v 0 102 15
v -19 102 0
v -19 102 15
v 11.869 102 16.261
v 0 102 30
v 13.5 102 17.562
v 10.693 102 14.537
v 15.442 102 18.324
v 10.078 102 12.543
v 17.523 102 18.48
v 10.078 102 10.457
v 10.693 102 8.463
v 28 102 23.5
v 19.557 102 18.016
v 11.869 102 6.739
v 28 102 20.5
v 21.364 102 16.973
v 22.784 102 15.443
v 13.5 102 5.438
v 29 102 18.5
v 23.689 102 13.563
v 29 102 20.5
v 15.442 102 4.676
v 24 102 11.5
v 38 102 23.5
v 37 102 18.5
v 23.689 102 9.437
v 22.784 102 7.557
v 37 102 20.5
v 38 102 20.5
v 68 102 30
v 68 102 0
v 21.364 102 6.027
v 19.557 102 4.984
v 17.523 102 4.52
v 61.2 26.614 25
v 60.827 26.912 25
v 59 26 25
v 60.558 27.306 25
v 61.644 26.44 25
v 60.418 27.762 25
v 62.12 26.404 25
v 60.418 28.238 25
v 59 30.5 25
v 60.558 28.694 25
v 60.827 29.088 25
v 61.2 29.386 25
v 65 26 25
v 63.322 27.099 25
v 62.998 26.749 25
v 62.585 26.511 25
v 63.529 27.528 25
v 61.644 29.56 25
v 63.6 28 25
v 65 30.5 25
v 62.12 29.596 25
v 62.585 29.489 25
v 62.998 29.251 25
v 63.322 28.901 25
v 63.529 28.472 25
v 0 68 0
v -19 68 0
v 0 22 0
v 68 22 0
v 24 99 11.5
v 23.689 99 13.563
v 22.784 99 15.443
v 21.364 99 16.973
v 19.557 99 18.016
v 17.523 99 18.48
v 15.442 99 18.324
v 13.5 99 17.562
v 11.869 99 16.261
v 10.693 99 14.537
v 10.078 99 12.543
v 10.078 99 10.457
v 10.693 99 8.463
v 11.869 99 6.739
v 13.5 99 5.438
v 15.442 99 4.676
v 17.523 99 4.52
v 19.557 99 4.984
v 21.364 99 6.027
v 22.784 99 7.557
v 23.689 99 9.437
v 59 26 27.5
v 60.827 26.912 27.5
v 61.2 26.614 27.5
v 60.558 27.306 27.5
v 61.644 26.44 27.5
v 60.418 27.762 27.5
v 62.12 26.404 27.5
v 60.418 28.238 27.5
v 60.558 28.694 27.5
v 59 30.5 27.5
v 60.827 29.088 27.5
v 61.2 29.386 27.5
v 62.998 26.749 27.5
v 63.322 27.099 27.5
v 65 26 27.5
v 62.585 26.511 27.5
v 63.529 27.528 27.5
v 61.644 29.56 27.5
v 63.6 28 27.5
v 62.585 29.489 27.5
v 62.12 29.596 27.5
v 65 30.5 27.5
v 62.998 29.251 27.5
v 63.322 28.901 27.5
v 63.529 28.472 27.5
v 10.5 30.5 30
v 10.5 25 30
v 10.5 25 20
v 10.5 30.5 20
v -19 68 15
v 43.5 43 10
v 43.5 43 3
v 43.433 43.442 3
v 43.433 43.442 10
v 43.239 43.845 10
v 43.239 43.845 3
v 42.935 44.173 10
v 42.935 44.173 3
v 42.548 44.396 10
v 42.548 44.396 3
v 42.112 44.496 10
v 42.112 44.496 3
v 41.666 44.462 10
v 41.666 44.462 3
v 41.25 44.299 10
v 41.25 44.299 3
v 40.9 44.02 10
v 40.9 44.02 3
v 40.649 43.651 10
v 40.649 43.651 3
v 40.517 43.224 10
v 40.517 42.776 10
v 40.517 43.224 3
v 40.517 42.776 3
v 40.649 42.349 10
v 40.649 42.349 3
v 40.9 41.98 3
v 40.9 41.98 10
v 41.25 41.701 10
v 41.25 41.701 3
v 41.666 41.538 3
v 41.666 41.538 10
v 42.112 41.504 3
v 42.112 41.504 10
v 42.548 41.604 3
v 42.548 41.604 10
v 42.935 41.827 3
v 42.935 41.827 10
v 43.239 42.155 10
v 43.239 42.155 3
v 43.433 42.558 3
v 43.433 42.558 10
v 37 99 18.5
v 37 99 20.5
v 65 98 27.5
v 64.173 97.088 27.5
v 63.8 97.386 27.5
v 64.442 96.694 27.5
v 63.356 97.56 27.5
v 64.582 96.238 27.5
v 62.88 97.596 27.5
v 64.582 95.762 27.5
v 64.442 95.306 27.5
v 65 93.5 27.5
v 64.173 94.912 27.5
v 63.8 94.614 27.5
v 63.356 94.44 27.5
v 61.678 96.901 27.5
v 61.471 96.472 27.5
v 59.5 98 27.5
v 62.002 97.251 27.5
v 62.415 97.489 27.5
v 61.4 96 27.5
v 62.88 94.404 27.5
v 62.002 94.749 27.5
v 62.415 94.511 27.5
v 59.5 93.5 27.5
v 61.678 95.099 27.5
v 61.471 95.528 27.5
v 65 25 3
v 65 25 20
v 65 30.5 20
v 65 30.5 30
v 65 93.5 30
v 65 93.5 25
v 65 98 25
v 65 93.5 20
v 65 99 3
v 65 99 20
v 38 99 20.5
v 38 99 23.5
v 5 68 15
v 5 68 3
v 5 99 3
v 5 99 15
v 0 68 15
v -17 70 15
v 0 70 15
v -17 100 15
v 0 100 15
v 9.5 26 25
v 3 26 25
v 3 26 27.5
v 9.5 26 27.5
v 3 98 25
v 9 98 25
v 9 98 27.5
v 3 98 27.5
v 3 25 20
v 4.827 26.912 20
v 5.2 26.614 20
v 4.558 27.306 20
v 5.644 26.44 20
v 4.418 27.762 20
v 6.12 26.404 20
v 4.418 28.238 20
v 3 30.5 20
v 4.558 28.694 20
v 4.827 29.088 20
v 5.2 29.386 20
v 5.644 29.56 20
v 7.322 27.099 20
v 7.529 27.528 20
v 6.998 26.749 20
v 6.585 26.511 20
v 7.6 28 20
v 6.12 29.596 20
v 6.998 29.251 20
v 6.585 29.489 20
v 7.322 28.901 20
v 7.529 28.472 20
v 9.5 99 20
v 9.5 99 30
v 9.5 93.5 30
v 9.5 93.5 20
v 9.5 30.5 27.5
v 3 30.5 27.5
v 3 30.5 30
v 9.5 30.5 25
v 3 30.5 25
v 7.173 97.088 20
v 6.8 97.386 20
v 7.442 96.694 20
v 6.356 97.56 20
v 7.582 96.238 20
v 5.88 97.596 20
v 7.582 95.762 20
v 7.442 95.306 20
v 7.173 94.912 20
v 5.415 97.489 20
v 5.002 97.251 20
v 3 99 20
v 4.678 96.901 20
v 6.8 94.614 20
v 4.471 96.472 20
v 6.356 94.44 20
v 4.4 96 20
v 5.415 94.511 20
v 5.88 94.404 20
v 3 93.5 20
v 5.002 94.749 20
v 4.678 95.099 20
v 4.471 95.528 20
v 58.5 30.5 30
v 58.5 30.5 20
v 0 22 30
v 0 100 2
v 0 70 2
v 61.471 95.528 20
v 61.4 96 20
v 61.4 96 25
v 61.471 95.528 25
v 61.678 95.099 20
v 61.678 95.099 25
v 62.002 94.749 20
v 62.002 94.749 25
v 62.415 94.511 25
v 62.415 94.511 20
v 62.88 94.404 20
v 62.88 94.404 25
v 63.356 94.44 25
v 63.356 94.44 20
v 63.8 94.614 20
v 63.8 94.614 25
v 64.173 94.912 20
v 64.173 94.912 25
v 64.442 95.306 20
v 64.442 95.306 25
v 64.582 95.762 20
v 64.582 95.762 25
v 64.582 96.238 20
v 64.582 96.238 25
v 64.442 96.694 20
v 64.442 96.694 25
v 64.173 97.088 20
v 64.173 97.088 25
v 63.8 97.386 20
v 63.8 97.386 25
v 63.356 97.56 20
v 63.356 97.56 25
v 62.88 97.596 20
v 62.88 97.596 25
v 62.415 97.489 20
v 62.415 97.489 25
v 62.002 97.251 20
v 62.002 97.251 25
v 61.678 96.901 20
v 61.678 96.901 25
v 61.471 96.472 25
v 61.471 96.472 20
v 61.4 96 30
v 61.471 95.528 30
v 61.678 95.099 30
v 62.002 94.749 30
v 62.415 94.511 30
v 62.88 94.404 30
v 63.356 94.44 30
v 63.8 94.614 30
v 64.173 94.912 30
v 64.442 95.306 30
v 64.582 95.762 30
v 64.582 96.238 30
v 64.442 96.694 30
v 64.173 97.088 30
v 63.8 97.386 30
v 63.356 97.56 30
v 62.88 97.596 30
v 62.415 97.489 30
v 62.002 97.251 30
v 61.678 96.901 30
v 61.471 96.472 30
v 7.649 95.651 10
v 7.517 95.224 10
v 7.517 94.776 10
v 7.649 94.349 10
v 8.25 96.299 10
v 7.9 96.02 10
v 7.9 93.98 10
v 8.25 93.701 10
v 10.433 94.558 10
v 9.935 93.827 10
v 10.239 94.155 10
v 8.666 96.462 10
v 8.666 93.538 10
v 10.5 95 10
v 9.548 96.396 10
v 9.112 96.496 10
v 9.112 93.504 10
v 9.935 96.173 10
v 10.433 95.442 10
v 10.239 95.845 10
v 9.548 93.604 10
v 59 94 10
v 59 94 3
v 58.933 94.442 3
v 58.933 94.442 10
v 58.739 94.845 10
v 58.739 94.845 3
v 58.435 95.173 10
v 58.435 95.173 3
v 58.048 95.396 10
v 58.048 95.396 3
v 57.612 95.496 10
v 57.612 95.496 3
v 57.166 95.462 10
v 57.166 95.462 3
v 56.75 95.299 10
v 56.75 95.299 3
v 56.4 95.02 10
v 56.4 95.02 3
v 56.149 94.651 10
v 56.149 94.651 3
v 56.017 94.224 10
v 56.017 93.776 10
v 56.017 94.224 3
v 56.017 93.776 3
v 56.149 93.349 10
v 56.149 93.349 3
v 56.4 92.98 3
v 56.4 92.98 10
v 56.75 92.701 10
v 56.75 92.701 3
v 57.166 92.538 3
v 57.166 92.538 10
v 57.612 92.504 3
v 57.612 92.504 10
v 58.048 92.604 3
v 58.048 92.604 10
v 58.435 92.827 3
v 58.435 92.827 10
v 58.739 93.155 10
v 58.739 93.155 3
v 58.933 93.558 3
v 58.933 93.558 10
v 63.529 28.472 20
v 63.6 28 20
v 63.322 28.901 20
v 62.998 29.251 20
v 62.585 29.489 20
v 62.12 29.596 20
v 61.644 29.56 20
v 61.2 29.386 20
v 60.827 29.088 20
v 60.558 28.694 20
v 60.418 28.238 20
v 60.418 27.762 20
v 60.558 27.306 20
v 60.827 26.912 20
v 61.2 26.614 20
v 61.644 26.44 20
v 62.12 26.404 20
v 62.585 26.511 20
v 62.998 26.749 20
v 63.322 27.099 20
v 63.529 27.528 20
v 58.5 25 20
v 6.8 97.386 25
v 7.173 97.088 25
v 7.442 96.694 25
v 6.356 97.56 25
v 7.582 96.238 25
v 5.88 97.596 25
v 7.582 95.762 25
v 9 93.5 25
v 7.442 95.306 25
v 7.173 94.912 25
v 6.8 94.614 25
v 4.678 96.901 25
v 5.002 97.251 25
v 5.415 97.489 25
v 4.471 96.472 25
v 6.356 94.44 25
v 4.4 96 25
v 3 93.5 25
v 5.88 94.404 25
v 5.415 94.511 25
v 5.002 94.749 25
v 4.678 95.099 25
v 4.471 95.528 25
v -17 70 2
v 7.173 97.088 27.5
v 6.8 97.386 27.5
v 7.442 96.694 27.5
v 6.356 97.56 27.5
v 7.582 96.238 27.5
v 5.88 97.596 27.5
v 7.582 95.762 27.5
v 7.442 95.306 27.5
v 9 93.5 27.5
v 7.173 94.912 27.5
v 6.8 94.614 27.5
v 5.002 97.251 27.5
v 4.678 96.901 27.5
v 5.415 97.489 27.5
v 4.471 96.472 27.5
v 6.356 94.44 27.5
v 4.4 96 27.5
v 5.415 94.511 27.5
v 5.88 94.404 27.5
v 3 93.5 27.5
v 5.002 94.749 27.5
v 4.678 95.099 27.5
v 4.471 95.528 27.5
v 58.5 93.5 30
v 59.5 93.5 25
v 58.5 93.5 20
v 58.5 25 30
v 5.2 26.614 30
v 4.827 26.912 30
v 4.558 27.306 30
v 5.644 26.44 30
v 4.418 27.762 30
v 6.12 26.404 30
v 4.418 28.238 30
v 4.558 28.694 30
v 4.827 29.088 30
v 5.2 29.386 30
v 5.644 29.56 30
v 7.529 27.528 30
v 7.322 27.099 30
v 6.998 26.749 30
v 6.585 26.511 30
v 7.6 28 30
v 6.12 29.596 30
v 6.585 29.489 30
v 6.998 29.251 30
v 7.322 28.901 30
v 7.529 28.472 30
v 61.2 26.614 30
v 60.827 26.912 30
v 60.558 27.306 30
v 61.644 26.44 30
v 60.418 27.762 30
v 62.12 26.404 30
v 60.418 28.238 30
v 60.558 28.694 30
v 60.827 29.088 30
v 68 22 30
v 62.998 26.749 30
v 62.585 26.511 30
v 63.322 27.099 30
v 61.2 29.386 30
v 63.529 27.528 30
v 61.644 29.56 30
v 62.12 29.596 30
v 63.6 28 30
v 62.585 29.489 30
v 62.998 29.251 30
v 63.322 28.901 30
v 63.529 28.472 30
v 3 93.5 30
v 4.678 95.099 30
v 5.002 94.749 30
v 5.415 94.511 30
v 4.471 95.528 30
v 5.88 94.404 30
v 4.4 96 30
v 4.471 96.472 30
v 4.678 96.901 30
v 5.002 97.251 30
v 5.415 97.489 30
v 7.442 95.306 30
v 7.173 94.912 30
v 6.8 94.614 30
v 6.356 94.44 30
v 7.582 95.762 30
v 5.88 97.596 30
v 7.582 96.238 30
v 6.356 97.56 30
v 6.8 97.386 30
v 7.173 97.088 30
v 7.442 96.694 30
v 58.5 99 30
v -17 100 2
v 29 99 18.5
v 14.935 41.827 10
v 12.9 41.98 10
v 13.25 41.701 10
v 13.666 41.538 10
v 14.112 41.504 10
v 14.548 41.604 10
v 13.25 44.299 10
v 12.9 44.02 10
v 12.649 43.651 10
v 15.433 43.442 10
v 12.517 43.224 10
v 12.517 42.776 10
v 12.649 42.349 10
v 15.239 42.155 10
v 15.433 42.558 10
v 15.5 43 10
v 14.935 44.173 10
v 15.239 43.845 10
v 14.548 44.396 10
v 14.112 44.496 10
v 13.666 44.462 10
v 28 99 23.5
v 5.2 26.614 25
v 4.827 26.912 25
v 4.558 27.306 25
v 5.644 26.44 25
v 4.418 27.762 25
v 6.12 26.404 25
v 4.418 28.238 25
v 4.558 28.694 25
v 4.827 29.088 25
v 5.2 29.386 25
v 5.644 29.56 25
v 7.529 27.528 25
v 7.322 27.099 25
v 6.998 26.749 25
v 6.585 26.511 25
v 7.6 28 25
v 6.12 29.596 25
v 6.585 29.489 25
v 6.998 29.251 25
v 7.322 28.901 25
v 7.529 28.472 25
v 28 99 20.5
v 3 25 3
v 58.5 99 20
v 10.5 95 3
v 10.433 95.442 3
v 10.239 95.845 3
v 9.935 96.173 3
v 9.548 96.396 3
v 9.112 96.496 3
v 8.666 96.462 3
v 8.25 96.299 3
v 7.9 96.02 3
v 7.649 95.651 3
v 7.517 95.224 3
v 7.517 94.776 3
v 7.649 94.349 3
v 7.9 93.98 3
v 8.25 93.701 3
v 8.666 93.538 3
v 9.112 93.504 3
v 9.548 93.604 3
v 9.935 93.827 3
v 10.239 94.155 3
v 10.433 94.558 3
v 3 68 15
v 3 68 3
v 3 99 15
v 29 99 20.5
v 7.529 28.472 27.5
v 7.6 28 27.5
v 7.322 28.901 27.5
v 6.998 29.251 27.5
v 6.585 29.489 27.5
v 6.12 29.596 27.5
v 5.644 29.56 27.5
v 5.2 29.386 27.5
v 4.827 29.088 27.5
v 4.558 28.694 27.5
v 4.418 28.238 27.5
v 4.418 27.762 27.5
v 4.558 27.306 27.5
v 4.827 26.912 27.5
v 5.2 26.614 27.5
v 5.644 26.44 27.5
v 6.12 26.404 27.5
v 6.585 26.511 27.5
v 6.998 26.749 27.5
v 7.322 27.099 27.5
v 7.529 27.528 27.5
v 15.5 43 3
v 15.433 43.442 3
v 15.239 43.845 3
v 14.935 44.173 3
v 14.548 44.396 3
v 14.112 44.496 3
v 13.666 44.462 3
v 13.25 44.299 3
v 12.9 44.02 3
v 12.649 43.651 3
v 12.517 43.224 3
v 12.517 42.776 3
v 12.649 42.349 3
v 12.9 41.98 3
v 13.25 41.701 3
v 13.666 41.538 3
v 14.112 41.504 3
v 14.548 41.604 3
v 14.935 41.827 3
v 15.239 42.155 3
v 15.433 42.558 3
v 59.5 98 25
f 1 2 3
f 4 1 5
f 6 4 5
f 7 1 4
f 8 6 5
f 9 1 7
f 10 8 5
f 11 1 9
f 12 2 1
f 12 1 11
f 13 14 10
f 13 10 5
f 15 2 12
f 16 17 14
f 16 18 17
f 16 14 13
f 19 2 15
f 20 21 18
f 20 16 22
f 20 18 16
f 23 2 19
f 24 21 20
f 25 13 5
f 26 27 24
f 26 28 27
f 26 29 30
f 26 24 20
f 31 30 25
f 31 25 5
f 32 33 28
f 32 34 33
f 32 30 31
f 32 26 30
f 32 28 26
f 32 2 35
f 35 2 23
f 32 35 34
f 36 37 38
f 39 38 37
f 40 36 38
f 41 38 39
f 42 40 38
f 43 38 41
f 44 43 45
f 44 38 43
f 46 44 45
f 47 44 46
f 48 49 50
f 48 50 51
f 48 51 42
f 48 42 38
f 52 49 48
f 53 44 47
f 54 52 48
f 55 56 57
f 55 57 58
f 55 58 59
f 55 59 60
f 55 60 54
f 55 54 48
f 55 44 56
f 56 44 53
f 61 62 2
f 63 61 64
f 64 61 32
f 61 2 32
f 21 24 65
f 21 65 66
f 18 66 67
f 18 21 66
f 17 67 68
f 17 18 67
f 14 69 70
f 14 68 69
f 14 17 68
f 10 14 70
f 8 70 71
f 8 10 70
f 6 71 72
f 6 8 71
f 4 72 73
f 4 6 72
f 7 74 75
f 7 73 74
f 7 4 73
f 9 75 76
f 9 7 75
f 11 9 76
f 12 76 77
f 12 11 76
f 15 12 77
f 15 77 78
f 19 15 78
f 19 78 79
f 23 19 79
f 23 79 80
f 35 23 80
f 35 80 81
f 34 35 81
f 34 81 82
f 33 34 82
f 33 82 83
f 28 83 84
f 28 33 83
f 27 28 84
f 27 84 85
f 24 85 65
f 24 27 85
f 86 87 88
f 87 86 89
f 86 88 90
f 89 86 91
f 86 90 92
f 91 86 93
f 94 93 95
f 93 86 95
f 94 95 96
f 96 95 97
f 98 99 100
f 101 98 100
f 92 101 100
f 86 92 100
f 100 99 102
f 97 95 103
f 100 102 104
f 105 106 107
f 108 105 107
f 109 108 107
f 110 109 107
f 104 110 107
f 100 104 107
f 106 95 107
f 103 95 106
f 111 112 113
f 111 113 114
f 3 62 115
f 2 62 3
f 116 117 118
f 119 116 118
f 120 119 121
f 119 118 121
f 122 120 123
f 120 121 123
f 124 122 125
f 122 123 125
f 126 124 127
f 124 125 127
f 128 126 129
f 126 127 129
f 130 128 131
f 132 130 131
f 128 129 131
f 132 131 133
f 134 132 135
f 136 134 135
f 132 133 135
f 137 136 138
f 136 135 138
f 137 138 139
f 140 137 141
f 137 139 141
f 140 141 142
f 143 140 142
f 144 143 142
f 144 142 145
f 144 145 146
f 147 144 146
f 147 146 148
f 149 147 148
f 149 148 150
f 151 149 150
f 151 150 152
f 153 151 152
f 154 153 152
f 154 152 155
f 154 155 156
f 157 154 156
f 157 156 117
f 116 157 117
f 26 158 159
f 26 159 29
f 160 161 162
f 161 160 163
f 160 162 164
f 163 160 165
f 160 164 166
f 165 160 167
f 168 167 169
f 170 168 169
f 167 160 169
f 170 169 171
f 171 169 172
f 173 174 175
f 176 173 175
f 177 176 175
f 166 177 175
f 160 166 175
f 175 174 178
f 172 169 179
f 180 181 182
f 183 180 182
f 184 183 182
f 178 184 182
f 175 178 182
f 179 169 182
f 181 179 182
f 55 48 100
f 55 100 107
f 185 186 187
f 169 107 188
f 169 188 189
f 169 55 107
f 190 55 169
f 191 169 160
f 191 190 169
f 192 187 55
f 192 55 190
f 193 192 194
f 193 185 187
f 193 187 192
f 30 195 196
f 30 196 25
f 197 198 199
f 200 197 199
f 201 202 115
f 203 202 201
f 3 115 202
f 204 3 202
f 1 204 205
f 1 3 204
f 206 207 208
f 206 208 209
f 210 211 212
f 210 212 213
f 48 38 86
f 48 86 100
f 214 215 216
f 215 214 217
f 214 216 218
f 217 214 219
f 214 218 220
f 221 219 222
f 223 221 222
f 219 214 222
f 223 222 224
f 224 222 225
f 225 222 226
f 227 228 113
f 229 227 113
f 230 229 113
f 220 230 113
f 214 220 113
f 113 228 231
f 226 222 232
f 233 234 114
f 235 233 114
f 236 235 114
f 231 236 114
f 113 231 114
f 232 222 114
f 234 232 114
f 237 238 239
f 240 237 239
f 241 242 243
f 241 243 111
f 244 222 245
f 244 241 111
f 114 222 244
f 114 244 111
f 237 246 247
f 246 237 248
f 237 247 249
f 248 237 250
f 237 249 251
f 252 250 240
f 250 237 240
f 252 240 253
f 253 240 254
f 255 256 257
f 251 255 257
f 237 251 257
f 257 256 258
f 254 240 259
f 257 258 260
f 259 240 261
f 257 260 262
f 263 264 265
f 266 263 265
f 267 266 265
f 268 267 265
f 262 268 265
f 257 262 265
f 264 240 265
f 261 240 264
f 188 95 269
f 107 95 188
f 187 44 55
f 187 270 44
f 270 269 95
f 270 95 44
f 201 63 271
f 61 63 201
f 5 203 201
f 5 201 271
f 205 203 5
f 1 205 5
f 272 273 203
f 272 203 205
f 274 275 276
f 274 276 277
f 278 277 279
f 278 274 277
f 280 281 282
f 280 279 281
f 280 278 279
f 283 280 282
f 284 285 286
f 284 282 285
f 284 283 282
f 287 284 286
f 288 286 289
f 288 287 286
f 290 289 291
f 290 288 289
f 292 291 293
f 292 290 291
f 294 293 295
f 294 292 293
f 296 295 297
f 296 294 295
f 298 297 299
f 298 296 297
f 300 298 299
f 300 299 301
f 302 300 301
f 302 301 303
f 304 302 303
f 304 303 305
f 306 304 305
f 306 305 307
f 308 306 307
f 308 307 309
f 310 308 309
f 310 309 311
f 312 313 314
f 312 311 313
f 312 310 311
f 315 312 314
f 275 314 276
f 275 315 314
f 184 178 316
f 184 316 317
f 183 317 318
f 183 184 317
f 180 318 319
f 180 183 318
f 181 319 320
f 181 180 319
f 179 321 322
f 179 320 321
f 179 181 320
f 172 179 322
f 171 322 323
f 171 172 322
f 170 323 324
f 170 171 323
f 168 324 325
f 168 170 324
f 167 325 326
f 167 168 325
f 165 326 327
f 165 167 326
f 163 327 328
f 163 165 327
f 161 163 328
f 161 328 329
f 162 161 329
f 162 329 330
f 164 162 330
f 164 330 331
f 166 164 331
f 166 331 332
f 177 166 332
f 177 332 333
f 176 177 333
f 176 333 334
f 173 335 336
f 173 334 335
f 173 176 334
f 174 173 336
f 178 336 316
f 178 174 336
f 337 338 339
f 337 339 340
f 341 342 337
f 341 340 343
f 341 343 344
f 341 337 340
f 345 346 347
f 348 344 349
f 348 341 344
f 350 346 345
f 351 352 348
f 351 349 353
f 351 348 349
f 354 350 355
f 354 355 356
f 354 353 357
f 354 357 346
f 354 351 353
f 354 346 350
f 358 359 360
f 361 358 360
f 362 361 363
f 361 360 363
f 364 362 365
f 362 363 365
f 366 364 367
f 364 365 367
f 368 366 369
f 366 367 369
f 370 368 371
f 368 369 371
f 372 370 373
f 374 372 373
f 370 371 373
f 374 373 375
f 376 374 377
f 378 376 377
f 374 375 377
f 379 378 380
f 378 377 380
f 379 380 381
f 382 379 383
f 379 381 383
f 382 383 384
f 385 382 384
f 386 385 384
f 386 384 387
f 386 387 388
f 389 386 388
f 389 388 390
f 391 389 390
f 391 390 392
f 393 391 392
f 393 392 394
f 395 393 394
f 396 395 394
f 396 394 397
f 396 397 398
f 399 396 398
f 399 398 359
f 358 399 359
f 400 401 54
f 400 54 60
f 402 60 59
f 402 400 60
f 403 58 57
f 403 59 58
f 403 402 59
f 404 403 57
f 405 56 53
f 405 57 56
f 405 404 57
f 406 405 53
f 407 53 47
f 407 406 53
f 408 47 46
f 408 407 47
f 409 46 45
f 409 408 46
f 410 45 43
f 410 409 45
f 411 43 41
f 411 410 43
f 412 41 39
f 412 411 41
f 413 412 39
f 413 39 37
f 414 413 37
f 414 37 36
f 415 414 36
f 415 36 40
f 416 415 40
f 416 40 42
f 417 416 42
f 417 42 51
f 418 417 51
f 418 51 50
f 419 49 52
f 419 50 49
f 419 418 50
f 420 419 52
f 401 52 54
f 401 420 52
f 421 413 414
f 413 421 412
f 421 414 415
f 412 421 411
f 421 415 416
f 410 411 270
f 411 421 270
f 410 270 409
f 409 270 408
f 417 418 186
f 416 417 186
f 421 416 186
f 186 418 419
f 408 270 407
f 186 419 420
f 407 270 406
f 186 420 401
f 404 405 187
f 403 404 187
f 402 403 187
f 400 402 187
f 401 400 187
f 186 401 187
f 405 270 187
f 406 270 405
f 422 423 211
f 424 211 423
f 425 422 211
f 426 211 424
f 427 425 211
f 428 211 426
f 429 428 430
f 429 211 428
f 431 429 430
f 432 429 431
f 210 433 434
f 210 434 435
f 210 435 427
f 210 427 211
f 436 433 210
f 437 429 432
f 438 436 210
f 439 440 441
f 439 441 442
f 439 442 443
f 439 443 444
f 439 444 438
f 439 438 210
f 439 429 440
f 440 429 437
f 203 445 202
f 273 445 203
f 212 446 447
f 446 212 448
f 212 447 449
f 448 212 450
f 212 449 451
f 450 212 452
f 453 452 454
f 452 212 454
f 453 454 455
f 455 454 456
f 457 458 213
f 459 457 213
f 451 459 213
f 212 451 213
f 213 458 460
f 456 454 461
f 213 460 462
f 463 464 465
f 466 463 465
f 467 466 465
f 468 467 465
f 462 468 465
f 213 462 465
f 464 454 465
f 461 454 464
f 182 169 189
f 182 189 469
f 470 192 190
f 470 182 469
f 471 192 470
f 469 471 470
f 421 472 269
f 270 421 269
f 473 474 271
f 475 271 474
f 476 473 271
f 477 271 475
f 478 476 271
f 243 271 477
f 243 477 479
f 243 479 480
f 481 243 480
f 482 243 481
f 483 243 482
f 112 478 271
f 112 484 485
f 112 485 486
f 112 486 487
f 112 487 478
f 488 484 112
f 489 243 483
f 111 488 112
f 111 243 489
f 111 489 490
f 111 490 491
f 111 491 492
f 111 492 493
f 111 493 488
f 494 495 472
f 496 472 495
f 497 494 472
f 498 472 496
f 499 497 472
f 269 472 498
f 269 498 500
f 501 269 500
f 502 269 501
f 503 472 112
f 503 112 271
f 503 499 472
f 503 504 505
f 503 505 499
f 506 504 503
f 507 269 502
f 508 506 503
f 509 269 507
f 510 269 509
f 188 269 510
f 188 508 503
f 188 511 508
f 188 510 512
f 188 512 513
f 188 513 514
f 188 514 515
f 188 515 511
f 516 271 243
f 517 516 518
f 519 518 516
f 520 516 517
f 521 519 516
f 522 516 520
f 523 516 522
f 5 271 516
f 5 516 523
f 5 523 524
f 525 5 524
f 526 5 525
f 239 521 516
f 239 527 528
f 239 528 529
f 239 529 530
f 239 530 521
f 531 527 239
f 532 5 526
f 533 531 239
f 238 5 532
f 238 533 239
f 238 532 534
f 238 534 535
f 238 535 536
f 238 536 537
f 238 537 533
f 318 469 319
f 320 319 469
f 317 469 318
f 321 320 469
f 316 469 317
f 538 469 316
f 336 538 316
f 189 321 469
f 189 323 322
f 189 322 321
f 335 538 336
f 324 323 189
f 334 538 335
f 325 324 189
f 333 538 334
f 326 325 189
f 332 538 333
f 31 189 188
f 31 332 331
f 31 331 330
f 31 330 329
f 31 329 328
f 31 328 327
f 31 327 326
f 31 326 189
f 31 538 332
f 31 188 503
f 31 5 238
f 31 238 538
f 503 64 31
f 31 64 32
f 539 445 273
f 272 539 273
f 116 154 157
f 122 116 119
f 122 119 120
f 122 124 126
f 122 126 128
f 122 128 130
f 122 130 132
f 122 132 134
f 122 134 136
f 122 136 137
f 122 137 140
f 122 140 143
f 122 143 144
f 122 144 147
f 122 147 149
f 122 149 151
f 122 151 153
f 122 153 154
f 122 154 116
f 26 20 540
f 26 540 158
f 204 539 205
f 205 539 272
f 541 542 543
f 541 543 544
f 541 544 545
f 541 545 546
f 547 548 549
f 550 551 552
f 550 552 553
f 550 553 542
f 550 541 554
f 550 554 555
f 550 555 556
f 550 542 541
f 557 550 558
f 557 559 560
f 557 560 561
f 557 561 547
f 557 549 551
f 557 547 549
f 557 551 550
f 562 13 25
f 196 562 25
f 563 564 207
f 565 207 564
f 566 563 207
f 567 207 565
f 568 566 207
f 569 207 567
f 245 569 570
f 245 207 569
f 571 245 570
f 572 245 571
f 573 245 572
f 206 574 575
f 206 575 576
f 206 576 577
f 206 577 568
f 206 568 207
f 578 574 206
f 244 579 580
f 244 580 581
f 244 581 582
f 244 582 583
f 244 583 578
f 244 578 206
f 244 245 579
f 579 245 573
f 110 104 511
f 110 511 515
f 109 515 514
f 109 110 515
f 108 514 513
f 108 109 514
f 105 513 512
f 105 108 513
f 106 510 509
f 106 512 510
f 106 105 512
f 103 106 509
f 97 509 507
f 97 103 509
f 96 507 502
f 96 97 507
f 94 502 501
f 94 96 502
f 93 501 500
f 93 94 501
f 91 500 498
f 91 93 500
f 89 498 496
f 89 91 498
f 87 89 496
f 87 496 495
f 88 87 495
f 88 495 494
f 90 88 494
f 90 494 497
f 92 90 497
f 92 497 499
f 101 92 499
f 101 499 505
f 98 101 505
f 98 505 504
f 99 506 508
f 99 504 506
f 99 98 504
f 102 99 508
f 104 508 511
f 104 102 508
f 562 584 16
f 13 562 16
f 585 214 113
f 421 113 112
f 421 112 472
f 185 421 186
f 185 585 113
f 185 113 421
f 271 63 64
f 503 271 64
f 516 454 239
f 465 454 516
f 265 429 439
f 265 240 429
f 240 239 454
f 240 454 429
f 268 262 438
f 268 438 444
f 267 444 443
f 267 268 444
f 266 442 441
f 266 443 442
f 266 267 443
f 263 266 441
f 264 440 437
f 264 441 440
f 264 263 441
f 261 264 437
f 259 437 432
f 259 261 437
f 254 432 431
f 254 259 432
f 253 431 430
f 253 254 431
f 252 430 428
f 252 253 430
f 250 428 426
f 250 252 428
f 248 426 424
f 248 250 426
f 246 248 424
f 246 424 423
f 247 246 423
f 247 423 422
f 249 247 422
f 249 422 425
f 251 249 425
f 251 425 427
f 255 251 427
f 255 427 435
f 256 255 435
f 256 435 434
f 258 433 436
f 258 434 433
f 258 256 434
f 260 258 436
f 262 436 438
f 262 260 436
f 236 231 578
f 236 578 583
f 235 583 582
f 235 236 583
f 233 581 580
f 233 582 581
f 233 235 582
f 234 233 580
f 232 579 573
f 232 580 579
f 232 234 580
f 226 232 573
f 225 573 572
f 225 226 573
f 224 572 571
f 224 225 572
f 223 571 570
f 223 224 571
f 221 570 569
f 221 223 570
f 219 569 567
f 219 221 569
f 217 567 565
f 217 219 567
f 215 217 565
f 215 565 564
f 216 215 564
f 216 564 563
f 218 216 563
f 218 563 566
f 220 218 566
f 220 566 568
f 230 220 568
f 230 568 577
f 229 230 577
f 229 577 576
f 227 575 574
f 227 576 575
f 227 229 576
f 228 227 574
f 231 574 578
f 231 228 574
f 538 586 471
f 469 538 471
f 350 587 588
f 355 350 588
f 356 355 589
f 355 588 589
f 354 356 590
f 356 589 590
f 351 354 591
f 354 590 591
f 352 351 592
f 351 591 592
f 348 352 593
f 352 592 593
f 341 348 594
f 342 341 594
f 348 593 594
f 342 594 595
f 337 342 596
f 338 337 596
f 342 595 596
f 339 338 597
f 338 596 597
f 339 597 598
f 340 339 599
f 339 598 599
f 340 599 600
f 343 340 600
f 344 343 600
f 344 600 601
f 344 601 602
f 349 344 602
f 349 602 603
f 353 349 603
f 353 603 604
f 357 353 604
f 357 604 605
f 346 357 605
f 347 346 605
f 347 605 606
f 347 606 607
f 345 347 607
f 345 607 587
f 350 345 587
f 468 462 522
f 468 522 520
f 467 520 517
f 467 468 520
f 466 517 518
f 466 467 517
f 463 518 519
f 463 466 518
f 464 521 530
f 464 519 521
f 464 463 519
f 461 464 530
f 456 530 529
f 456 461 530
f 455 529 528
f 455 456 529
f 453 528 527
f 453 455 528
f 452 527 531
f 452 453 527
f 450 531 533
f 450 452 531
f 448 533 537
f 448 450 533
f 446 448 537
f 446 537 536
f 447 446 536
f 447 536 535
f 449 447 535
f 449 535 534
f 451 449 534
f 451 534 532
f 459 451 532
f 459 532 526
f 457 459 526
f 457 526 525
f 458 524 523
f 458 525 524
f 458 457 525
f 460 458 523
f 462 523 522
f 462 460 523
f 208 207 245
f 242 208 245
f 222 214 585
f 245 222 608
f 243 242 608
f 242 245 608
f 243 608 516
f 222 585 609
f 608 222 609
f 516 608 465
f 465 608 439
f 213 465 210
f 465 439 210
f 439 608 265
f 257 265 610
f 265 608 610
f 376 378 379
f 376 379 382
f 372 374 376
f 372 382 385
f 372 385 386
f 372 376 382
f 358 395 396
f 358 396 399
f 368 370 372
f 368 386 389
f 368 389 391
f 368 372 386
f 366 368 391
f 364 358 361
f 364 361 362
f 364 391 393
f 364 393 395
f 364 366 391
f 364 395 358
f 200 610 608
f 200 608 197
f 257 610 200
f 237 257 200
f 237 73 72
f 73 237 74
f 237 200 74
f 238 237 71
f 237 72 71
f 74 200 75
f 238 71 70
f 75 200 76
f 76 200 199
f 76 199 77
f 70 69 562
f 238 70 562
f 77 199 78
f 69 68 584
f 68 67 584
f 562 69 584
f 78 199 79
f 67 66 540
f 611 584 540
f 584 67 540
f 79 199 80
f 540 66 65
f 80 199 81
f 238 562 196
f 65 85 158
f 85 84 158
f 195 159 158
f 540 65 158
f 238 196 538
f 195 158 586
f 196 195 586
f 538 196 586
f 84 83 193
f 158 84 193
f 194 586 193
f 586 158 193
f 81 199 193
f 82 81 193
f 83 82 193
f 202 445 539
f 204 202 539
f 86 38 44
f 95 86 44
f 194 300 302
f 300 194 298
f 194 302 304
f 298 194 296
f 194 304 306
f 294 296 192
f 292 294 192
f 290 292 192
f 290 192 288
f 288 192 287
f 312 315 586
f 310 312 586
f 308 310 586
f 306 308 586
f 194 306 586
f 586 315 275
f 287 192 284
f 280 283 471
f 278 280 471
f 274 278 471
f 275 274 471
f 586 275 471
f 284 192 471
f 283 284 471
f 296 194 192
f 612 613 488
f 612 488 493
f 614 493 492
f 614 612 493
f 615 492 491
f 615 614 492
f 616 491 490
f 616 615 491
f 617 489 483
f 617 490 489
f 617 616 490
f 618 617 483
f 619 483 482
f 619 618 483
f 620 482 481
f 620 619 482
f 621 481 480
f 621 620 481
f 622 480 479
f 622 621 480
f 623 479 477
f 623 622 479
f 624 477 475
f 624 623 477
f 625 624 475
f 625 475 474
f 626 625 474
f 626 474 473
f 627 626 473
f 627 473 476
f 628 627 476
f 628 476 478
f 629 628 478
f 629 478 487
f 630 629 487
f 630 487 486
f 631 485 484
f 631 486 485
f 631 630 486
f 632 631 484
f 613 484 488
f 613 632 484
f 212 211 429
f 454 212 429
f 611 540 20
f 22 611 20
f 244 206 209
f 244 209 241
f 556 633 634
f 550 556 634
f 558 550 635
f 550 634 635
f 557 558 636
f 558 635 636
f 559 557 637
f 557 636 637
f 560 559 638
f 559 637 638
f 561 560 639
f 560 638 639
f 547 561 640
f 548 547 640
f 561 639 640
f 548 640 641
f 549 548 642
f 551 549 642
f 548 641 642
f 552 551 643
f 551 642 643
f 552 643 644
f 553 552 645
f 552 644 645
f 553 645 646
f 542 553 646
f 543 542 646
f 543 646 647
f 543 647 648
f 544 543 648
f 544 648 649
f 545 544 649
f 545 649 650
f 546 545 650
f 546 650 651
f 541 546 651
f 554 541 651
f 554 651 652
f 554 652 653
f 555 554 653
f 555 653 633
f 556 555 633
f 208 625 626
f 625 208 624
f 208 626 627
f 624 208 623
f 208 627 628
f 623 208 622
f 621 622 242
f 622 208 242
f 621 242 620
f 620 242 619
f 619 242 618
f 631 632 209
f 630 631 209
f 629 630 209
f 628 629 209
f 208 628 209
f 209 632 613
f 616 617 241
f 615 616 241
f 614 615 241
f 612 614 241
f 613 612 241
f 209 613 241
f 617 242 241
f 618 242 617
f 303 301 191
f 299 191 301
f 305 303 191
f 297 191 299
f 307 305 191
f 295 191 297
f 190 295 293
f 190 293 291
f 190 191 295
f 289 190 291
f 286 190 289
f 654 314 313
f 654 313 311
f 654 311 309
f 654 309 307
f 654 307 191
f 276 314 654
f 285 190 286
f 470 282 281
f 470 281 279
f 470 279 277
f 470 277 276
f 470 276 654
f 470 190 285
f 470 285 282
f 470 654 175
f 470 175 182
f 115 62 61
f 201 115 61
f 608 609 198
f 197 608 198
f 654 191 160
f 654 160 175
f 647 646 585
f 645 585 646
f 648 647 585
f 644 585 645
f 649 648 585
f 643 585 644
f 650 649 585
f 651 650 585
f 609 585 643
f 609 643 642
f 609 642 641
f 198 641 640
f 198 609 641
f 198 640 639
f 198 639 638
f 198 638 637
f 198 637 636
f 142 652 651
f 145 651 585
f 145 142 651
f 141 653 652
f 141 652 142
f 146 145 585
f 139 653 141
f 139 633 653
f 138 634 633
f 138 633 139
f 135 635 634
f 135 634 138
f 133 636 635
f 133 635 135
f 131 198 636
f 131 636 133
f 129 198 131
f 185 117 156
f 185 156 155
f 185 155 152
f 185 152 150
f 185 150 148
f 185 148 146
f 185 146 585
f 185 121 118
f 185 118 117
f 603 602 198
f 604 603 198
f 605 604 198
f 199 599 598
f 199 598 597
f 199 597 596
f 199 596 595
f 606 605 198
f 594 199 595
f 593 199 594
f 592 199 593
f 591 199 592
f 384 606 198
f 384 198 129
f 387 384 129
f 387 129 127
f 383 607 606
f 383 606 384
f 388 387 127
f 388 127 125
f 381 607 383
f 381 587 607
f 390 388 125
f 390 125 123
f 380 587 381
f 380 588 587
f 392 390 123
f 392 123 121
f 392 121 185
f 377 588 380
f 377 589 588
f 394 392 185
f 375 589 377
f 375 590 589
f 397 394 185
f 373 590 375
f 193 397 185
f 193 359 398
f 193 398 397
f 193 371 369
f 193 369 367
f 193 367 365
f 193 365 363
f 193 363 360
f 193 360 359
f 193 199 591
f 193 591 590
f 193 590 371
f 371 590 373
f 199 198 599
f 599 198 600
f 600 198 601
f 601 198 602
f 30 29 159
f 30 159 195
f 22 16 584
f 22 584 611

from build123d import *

# Parameters (mm, degrees)
BOX019_W               = 20
BOX019_H               = 30
BOX019_DEPTH           = 15
BOX018_W               = 24
BOX018_H               = 34
BOX018_DEPTH           = 15
CYLINDER011_R          = 1.6
CYLINDER011_DEPTH      = 30
BOX013_W               = 6.5
BOX013_H               = 5
BOX013_DEPTH           = 2.5
BOX014_W               = 8
BOX014_H               = 6
BOX014_DEPTH           = 10
CUT006_PLACEMENT_ANGLE = 180
CYLINDER010_R          = 1.6
CYLINDER010_DEPTH      = 30
BOX012_W               = 6.5
BOX012_H               = 5
BOX012_DEPTH           = 2.5
BOX011_W               = 8
BOX011_H               = 6
BOX011_DEPTH           = 10
CYLINDER009_R          = 1.6
CYLINDER009_DEPTH      = 30
BOX010_W               = 6.5
BOX010_H               = 5
BOX010_DEPTH           = 2.5
BOX009_W               = 8
BOX009_H               = 6
BOX009_DEPTH           = 10
BOX004_W               = 3
BOX004_H               = 80
BOX004_DEPTH           = 30
BOX003_W               = 3
BOX003_H               = 80
BOX003_DEPTH           = 30
BOX001_W               = 65
BOX001_H               = 3
BOX001_DEPTH           = 30
CYLINDER001_R          = 1.5
CYLINDER001_DEPTH      = 10
CYLINDER002_R          = 1.5
CYLINDER002_DEPTH      = 10
CYLINDER003_R          = 1.5
CYLINDER003_DEPTH      = 10
BOX_W                  = 65
BOX_H                  = 78
BOX_DEPTH              = 3
CYLINDER_R             = 1.5
CYLINDER_DEPTH         = 10
BOX008_W               = 10
BOX008_H               = 10
BOX008_DEPTH           = 3
BOX007_W               = 8
BOX007_H               = 10
BOX007_DEPTH           = 3
CYLINDER008_R          = 7
CYLINDER008_DEPTH      = 10
BOX002_W               = 65
BOX002_H               = 3
BOX002_DEPTH           = 30
CYLINDER012_R          = 1.6
CYLINDER012_DEPTH      = 30
BOX015_W               = 6.5
BOX015_H               = 5
BOX015_DEPTH           = 2.5
BOX016_W               = 8
BOX016_H               = 6
BOX016_DEPTH           = 10
CUT007_PLACEMENT_ANGLE = 180


with BuildPart() as cube015:
    # Box019 → Box019 (new body)
    with BuildSketch(Plane(origin=(-17, 70, 2), x_dir=(1, 0, 0), z_dir=(0, 0, 1))):
        with Locations((10, 15)):
            Rectangle(BOX019_W, BOX019_H)
    extrude(amount=BOX019_DEPTH)


with BuildPart() as cut009:
    # Box018 → Box018 (new body)
    with BuildSketch(Plane(origin=(-19, 68, 0), x_dir=(1, 0, 0), z_dir=(0, 0, 1))):
        with Locations((12, 17)):
            Rectangle(BOX018_W, BOX018_H)
    extrude(amount=BOX018_DEPTH)

    # Cut009: cut Cube015
    add(cube015.part, mode=Mode.SUBTRACT)


with BuildPart() as cylinder011:
    # Cylinder011 → Cylinder011 (new body)
    with BuildSketch(Plane(origin=(6, 29, 0), x_dir=(1, 0, 0), z_dir=(0, 0, 1))):
        Circle(CYLINDER011_R)
    extrude(amount=CYLINDER011_DEPTH)


with BuildPart() as cube009:
    # Box013 → Box013 (new body)
    with BuildSketch(Plane(origin=(3, 27, 20), x_dir=(1, 0, 0), z_dir=(0, 0, 1))):
        with Locations((3.25, 2.5)):
            Rectangle(BOX013_W, BOX013_H)
    extrude(amount=BOX013_DEPTH)


with BuildPart() as cut006:
    # Box014 → Box014 (new body)
    with BuildSketch(Plane(origin=(2.5, 25.5, 15), x_dir=(1, 0, 0), z_dir=(0, 0, 1))):
        with Locations((4, 3)):
            Rectangle(BOX014_W, BOX014_H)
    extrude(amount=BOX014_DEPTH)

    # Cut005: cut Cube009
    add(cube009.part, mode=Mode.SUBTRACT)

    # Cut006: cut Cylinder011
    add(cylinder011.part, mode=Mode.SUBTRACT)


with BuildPart() as cut006_1:
    # Cut006 placement: moved
    add(cut006.part.moved(Location((69, 125, 5))).rotate(Axis((69, 125, 5), (0, 0, 1)), CUT006_PLACEMENT_ANGLE))


with BuildPart() as cylinder010:
    # Cylinder010 → Cylinder010 (new body)
    with BuildSketch(Plane(origin=(6, 29, 0), x_dir=(1, 0, 0), z_dir=(0, 0, 1))):
        Circle(CYLINDER010_R)
    extrude(amount=CYLINDER010_DEPTH)


with BuildPart() as cube008:
    # Box012 → Box012 (new body)
    with BuildSketch(Plane(origin=(3, 27, 20), x_dir=(1, 0, 0), z_dir=(0, 0, 1))):
        with Locations((3.25, 2.5)):
            Rectangle(BOX012_W, BOX012_H)
    extrude(amount=BOX012_DEPTH)


with BuildPart() as cut003:
    # Box011 → Box011 (new body)
    with BuildSketch(Plane(origin=(2.5, 25.5, 15), x_dir=(1, 0, 0), z_dir=(0, 0, 1))):
        with Locations((4, 3)):
            Rectangle(BOX011_W, BOX011_H)
    extrude(amount=BOX011_DEPTH)

    # Cut004: cut Cube008
    add(cube008.part, mode=Mode.SUBTRACT)

    # Cut003: cut Cylinder010
    add(cylinder010.part, mode=Mode.SUBTRACT)


with BuildPart() as cut003_1:
    # Cut003 placement: moved
    add(cut003.part.moved(Location((56, -1, 5))))


with BuildPart() as cylinder:
    # Cylinder009 → Cylinder009 (new body)
    with BuildSketch(Plane(origin=(6, 29, 0), x_dir=(1, 0, 0), z_dir=(0, 0, 1))):
        Circle(CYLINDER009_R)
    extrude(amount=CYLINDER009_DEPTH)


with BuildPart() as cube006:
    # Box010 → Box010 (new body)
    with BuildSketch(Plane(origin=(3, 27, 20), x_dir=(1, 0, 0), z_dir=(0, 0, 1))):
        with Locations((3.25, 2.5)):
            Rectangle(BOX010_W, BOX010_H)
    extrude(amount=BOX010_DEPTH)


with BuildPart() as cut002:
    # Box009 → Box009 (new body)
    with BuildSketch(Plane(origin=(2.5, 25.5, 15), x_dir=(1, 0, 0), z_dir=(0, 0, 1))):
        with Locations((4, 3)):
            Rectangle(BOX009_W, BOX009_H)
    extrude(amount=BOX009_DEPTH)

    # Cut001: cut Cube006
    add(cube006.part, mode=Mode.SUBTRACT)

    # Cut002: cut Cylinder
    add(cylinder.part, mode=Mode.SUBTRACT)


with BuildPart() as cut002_1:
    # Cut002 placement: moved
    add(cut002.part.moved(Location((0, -1, 5))))


with BuildPart() as cube004:
    # Box004 → Box004 (new body)
    with BuildSketch(Plane(origin=(65, 22, 0), x_dir=(1, 0, 0), z_dir=(0, 0, 1))):
        with Locations((1.5, 40)):
            Rectangle(BOX004_W, BOX004_H)
    extrude(amount=BOX004_DEPTH)


with BuildPart() as cube003:
    # Box003 → Box003 (new body)
    with BuildSketch(Plane(origin=(0, 22, 0), x_dir=(1, 0, 0), z_dir=(0, 0, 1))):
        with Locations((1.5, 40)):
            Rectangle(BOX003_W, BOX003_H)
    extrude(amount=BOX003_DEPTH)


with BuildPart() as cube001:
    # Box001 → Box001 (new body)
    with BuildSketch(Plane(origin=(0, 22, 0), x_dir=(1, 0, 0), z_dir=(0, 0, 1))):
        with Locations((32.5, 1.5)):
            Rectangle(BOX001_W, BOX001_H)
    extrude(amount=BOX001_DEPTH)


with BuildPart() as cilindro001:
    # Cylinder001 → Cylinder001 (new body)
    with BuildSketch(Plane(origin=(42, 43, 0), x_dir=(1, 0, 0), z_dir=(0, 0, 1))):
        Circle(CYLINDER001_R)
    extrude(amount=CYLINDER001_DEPTH)


with BuildPart() as cilindro002:
    # Cylinder002 → Cylinder002 (new body)
    with BuildSketch(Plane(origin=(57.5, 94, 0), x_dir=(1, 0, 0), z_dir=(0, 0, 1))):
        Circle(CYLINDER002_R)
    extrude(amount=CYLINDER002_DEPTH)


with BuildPart() as cilindro003:
    # Cylinder003 → Cylinder003 (new body)
    with BuildSketch(Plane(origin=(9, 95, 0), x_dir=(1, 0, 0), z_dir=(0, 0, 1))):
        Circle(CYLINDER003_R)
    extrude(amount=CYLINDER003_DEPTH)


with BuildPart() as cube:
    # Box → Box (new body)
    with BuildSketch(Plane(origin=(0, 22, 0), x_dir=(1, 0, 0), z_dir=(0, 0, 1))):
        with Locations((32.5, 39)):
            Rectangle(BOX_W, BOX_H)
    extrude(amount=BOX_DEPTH)


with BuildPart() as fusion:
    # Cylinder → Cylinder (new body)
    with BuildSketch(Plane(origin=(14, 43, 0), x_dir=(1, 0, 0), z_dir=(0, 0, 1))):
        Circle(CYLINDER_R)
    extrude(amount=CYLINDER_DEPTH)

    # Fusion: union Cilindro001, Cilindro002, Cilindro003, Cube
    add(cilindro001.part)
    add(cilindro002.part)
    add(cilindro003.part)
    add(cube.part)


with BuildPart() as cubo008:
    # Box008 → Box008 (new body)
    with BuildSketch(Plane(origin=(28, 96, 20), x_dir=(1, 0, 0), z_dir=(0, 0, 1))):
        with Locations((5, 5)):
            Rectangle(BOX008_W, BOX008_H)
    extrude(amount=BOX008_DEPTH)


with BuildPart() as fusion001006:
    # Box007 → Box007 (new body)
    with BuildSketch(Plane(origin=(29, 96, 18), x_dir=(1, 0, 0), z_dir=(0, 0, 1))):
        with Locations((4, 5)):
            Rectangle(BOX007_W, BOX007_H)
    extrude(amount=BOX007_DEPTH)

    # Fusion001006: union Cubo008
    add(cubo008.part)


with BuildPart() as fusion001006_1:
    # Fusion001006 placement: moved
    add(fusion001006.part.moved(Location((0, 0, 1))))


with BuildPart() as fusion001005:
    # Cylinder008 → Cylinder008 (new body)
    with BuildSketch(Plane(origin=(17, 106, 12), x_dir=(1, 0, 0), z_dir=(0, -1, 0))):
        Circle(CYLINDER008_R)
    extrude(amount=CYLINDER008_DEPTH)

    # Fusion001005: union Fusion001006
    add(fusion001006_1.part)


with BuildPart() as fusion001005_1:
    # Fusion001005 placement: moved
    add(fusion001005.part.moved(Location((0, 1, -0.5))))


with BuildPart() as caja:
    # Box002 → Box002 (new body)
    with BuildSketch(Plane(origin=(0, 99, 0), x_dir=(1, 0, 0), z_dir=(0, 0, 1))):
        with Locations((32.5, 1.5)):
            Rectangle(BOX002_W, BOX002_H)
    extrude(amount=BOX002_DEPTH)

    # Cut: cut Fusion001005
    add(fusion001005_1.part, mode=Mode.SUBTRACT)

    # Fusion001007: union Cube004, Cube003, Cube001, Fusion
    add(cube004.part)
    add(cube003.part)
    add(cube001.part)
    add(fusion.part)


with BuildPart() as cylinder012:
    # Cylinder012 → Cylinder012 (new body)
    with BuildSketch(Plane(origin=(6, 29, 0), x_dir=(1, 0, 0), z_dir=(0, 0, 1))):
        Circle(CYLINDER012_R)
    extrude(amount=CYLINDER012_DEPTH)


with BuildPart() as cube011:
    # Box015 → Box015 (new body)
    with BuildSketch(Plane(origin=(3, 27, 20), x_dir=(1, 0, 0), z_dir=(0, 0, 1))):
        with Locations((3.25, 2.5)):
            Rectangle(BOX015_W, BOX015_H)
    extrude(amount=BOX015_DEPTH)


with BuildPart() as fusion001009:
    # Box016 → Box016 (new body)
    with BuildSketch(Plane(origin=(2.5, 25.5, 15), x_dir=(1, 0, 0), z_dir=(0, 0, 1))):
        with Locations((4, 3)):
            Rectangle(BOX016_W, BOX016_H)
    extrude(amount=BOX016_DEPTH)

    # Cut008: cut Cube011
    add(cube011.part, mode=Mode.SUBTRACT)

    # Cut007: cut Cylinder012
    add(cylinder012.part, mode=Mode.SUBTRACT)


with BuildPart() as fusion001009_1:
    # Cut007 placement: moved
    add(fusion001009.part.moved(Location((12, 125, 5))).rotate(Axis((12, 125, 5), (0, 0, 1)), CUT007_PLACEMENT_ANGLE))

    # Fusion001008: union Cut006, Cut003, Cut002, caja
    add(cut006_1.part)
    add(cut003_1.part)
    add(cut002_1.part)
    add(caja.part)

    # Fusion001009: union Cut009
    add(cut009.part)


solid = fusion001009_1.part
